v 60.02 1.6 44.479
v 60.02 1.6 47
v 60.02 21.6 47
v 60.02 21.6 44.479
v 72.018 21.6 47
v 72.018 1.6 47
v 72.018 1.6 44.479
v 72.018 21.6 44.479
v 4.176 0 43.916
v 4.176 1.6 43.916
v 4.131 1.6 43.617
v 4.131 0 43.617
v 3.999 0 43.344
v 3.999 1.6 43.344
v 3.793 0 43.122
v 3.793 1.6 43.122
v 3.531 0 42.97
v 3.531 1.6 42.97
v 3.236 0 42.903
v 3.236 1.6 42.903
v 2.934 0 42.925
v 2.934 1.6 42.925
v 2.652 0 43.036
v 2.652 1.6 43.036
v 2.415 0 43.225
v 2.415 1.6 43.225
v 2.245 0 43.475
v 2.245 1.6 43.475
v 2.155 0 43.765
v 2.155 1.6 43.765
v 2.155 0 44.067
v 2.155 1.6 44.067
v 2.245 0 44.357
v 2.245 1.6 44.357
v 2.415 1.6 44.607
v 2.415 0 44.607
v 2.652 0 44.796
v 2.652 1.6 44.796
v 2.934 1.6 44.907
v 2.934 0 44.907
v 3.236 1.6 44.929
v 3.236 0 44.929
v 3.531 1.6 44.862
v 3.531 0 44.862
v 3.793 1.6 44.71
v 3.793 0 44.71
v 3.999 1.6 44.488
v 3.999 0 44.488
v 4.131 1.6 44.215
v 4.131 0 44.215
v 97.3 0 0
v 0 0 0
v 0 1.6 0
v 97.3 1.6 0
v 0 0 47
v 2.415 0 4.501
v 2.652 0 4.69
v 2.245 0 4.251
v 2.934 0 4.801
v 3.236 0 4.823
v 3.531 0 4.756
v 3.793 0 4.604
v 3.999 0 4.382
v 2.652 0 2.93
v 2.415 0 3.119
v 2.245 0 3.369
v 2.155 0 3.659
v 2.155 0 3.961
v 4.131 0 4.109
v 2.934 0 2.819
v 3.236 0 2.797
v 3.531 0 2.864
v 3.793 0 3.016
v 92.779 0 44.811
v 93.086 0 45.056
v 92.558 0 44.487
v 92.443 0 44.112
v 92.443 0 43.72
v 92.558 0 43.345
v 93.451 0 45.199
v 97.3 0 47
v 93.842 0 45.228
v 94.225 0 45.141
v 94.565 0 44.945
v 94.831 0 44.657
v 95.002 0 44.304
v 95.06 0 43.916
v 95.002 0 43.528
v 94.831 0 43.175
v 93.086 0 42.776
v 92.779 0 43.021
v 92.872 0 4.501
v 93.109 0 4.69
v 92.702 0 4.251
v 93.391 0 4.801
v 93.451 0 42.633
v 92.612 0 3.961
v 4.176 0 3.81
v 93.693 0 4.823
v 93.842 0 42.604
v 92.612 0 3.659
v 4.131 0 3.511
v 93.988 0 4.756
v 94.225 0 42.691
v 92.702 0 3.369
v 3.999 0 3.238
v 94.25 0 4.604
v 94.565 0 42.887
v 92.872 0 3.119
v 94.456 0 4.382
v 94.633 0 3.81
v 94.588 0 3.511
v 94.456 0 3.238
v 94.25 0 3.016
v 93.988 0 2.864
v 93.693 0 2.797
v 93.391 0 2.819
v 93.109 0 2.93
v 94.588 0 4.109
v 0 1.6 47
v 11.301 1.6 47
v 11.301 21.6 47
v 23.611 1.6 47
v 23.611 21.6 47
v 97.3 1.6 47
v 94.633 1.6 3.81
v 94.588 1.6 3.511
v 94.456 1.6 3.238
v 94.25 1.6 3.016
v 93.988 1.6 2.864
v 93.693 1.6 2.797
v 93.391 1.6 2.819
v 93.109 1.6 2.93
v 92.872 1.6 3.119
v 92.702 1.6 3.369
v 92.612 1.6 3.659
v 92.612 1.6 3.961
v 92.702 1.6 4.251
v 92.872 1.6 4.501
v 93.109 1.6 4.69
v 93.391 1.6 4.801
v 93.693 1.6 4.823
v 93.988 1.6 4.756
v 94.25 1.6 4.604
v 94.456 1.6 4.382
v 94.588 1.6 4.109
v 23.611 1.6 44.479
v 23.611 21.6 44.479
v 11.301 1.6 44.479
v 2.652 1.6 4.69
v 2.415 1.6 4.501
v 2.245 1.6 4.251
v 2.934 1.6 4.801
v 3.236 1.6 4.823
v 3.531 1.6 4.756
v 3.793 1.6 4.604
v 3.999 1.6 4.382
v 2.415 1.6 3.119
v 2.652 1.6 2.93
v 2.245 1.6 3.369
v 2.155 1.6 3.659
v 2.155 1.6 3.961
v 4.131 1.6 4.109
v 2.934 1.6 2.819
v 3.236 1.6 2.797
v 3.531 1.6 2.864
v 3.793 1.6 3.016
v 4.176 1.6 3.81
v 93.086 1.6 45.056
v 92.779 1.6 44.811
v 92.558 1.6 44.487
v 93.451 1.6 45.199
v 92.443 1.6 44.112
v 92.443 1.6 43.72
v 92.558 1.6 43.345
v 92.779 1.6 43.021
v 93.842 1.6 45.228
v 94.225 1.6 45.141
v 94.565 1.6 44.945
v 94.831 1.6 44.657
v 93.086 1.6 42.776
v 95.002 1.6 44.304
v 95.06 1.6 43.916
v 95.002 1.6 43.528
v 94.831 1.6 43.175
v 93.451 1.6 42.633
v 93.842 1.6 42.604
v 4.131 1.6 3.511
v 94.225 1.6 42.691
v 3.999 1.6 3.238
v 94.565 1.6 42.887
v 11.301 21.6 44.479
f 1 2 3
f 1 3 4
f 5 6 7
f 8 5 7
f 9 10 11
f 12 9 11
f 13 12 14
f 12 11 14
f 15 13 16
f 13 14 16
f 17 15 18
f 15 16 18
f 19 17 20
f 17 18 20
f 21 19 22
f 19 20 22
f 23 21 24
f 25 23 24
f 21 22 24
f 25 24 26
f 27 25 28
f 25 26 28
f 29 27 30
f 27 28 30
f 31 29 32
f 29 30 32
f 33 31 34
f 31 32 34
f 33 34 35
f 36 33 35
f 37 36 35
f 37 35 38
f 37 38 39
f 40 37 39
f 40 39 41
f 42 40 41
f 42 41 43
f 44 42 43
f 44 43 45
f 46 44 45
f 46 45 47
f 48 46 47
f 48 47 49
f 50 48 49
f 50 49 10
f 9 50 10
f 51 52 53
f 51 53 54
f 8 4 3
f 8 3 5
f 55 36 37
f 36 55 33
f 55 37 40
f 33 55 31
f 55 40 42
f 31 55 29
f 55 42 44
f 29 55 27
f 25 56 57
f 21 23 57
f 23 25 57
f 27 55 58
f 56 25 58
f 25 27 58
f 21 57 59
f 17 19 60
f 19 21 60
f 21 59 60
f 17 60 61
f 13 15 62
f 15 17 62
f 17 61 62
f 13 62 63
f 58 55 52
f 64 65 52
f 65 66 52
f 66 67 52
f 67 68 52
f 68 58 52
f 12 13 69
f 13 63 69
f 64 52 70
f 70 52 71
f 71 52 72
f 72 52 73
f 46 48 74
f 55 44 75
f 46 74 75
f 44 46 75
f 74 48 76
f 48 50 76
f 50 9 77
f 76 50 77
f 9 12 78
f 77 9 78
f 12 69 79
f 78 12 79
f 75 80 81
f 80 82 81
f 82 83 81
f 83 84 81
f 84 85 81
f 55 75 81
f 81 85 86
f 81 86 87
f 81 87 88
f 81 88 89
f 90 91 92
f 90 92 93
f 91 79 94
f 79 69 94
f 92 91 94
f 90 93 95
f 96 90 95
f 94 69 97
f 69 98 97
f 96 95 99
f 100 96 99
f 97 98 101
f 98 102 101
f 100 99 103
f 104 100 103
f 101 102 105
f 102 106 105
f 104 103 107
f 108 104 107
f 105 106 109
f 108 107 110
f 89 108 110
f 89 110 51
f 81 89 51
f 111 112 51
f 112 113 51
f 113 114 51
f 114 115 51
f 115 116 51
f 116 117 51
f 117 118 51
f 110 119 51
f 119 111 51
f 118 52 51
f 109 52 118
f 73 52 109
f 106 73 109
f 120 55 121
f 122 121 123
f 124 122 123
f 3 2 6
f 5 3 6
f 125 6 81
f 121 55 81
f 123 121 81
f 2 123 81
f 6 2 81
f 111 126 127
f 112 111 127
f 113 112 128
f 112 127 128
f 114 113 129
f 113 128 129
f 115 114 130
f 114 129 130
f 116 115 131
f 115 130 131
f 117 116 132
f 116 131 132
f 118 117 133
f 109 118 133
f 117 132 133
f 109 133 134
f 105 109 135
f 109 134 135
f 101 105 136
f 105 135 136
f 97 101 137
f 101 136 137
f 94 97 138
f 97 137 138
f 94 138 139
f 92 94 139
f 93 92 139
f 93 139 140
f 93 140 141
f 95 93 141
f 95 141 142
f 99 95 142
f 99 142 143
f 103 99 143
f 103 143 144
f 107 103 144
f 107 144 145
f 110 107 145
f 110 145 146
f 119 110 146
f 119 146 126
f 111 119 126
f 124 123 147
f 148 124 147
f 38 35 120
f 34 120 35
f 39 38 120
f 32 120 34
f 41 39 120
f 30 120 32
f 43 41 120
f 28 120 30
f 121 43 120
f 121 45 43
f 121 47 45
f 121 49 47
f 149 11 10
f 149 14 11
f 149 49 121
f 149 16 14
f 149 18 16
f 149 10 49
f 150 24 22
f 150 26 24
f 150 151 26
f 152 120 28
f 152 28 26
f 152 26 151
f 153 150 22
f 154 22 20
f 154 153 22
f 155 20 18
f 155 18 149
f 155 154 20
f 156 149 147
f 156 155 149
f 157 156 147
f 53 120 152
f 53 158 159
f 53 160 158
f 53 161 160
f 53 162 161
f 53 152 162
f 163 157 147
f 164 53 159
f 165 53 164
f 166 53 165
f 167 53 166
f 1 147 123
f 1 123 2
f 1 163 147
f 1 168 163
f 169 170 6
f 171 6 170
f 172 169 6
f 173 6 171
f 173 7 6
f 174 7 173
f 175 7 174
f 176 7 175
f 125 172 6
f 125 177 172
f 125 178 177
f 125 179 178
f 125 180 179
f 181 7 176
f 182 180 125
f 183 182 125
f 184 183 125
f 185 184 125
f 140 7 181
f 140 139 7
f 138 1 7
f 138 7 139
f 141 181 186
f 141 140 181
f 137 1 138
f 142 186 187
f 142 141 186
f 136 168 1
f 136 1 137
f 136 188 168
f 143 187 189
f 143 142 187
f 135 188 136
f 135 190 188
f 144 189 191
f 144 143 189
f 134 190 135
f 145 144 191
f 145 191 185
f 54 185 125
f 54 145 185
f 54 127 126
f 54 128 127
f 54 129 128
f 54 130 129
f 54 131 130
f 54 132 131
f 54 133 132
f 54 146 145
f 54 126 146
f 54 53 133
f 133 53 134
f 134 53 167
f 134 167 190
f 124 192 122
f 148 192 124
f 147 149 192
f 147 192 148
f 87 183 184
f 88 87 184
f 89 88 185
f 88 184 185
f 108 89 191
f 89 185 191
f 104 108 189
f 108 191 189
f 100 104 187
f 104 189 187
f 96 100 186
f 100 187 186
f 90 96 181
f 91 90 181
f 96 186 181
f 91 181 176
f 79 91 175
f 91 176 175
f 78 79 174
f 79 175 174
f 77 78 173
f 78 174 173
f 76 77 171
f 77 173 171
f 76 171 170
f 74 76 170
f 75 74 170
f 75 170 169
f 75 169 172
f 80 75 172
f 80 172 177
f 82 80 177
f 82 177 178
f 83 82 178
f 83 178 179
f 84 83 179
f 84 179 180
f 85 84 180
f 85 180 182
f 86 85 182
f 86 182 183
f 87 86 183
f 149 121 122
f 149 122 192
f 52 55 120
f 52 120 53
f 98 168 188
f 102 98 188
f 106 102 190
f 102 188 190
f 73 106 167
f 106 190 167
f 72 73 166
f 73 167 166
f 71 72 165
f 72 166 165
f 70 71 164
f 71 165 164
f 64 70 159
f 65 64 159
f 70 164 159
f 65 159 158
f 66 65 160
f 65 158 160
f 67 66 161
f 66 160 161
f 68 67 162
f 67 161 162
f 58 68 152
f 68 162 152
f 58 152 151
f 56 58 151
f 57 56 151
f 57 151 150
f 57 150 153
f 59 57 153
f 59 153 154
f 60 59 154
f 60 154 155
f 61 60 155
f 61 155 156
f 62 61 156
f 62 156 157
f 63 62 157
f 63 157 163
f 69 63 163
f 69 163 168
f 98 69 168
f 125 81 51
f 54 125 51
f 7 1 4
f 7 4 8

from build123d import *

# Parameters (mm, degrees)
SKETCH1_W           = 97.3
SKETCH1_H           = 47
BOSS_EXTRUDE1_DEPTH = 1.6
SKETCH2_W           = 12.310757006
SKETCH2_H           = 2.521357674
SKETCH2_W_2         = 11.997879532
BOSS_EXTRUDE2_DEPTH = 20
SKETCH3_R           = 1.016
SKETCH3_R_2         = 1.316
CUT_EXTRUDE3_DEPTH  = 2.6


with BuildPart() as part:
    # Sketch1 → Boss-Extrude1 (new body)
    with BuildSketch(Plane(origin=(0, 0, 0), x_dir=(1, 0, 0), z_dir=(0, 1, 0))):
        with Locations((48.65, -23.5)):
            Rectangle(SKETCH1_W, SKETCH1_H)
    extrude(amount=BOSS_EXTRUDE1_DEPTH)

    # Sketch2 → Boss-Extrude2 (add)
    with BuildSketch(Plane(origin=(0, 1.6, 0), x_dir=(1, 0, 0), z_dir=(0, 1, 0))):
        with Locations((17.456098962, -45.739321163)):
            Rectangle(SKETCH2_W, SKETCH2_H)
        with Locations((66.019073535, -45.739321163)):
            Rectangle(SKETCH2_W_2, SKETCH2_H)
    extrude(amount=BOSS_EXTRUDE2_DEPTH)

    # Sketch3 → Cut-Extrude3 (cut, through all)
    with BuildSketch(Plane(origin=(0, 1.6, 0), x_dir=(1, 0, 0), z_dir=(0, 1, 0))):
        with Locations((3.16, -3.81)):
            Circle(SKETCH3_R)
        with Locations((93.617, -3.81)):
            Circle(SKETCH3_R)
        with Locations((93.744, -43.916)):
            Circle(SKETCH3_R_2)
        with Locations((3.16, -43.916)):
            Circle(SKETCH3_R)
    extrude(amount=-CUT_EXTRUDE3_DEPTH, mode=Mode.SUBTRACT)


solid = part.part
